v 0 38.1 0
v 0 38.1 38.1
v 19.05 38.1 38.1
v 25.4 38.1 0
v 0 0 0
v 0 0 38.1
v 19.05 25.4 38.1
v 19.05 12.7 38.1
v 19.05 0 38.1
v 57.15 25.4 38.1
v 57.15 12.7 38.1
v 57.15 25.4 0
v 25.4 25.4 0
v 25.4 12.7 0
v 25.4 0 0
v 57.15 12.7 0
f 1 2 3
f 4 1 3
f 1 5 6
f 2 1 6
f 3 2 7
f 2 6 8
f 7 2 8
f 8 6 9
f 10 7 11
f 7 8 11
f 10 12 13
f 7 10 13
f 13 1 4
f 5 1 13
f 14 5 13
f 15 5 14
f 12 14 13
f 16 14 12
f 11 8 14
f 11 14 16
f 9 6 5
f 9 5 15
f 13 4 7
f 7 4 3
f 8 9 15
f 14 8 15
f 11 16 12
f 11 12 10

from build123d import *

# Parameters (mm, degrees)
F0_W     = 57.15
F0_H     = 38.1
F1_DEPTH = 38.1
F3_DEPTH = 12.7
F5_DEPTH = 12.7


with BuildPart() as f1:
    # F0 (on Front) → F1 (new body)
    with BuildSketch(Plane.XZ):
        with Locations((28.575, 19.05)):
            Rectangle(F0_W, F0_H)
    extrude(amount=-F1_DEPTH)

    # F2 (on face) → F3 (cut)
    with BuildSketch(Plane.XZ):
        Polygon((57.15, 38.1), (19.05, 38.1), (25.4, 0), (57.15, 0), align=None)
    extrude(amount=-F3_DEPTH, mode=Mode.SUBTRACT)

    # F4 (on face) → F5 (cut)
    with BuildSketch(Plane(origin=(0, 38.1, 0), x_dir=(-1, 0, 0), z_dir=(0, 1, 0))):
        Polygon((-25.4, 0), (-19.05, 38.1), (-57.15, 38.1), (-57.15, 0), align=None)
    extrude(amount=-F5_DEPTH, mode=Mode.SUBTRACT)


solid = f1.part
